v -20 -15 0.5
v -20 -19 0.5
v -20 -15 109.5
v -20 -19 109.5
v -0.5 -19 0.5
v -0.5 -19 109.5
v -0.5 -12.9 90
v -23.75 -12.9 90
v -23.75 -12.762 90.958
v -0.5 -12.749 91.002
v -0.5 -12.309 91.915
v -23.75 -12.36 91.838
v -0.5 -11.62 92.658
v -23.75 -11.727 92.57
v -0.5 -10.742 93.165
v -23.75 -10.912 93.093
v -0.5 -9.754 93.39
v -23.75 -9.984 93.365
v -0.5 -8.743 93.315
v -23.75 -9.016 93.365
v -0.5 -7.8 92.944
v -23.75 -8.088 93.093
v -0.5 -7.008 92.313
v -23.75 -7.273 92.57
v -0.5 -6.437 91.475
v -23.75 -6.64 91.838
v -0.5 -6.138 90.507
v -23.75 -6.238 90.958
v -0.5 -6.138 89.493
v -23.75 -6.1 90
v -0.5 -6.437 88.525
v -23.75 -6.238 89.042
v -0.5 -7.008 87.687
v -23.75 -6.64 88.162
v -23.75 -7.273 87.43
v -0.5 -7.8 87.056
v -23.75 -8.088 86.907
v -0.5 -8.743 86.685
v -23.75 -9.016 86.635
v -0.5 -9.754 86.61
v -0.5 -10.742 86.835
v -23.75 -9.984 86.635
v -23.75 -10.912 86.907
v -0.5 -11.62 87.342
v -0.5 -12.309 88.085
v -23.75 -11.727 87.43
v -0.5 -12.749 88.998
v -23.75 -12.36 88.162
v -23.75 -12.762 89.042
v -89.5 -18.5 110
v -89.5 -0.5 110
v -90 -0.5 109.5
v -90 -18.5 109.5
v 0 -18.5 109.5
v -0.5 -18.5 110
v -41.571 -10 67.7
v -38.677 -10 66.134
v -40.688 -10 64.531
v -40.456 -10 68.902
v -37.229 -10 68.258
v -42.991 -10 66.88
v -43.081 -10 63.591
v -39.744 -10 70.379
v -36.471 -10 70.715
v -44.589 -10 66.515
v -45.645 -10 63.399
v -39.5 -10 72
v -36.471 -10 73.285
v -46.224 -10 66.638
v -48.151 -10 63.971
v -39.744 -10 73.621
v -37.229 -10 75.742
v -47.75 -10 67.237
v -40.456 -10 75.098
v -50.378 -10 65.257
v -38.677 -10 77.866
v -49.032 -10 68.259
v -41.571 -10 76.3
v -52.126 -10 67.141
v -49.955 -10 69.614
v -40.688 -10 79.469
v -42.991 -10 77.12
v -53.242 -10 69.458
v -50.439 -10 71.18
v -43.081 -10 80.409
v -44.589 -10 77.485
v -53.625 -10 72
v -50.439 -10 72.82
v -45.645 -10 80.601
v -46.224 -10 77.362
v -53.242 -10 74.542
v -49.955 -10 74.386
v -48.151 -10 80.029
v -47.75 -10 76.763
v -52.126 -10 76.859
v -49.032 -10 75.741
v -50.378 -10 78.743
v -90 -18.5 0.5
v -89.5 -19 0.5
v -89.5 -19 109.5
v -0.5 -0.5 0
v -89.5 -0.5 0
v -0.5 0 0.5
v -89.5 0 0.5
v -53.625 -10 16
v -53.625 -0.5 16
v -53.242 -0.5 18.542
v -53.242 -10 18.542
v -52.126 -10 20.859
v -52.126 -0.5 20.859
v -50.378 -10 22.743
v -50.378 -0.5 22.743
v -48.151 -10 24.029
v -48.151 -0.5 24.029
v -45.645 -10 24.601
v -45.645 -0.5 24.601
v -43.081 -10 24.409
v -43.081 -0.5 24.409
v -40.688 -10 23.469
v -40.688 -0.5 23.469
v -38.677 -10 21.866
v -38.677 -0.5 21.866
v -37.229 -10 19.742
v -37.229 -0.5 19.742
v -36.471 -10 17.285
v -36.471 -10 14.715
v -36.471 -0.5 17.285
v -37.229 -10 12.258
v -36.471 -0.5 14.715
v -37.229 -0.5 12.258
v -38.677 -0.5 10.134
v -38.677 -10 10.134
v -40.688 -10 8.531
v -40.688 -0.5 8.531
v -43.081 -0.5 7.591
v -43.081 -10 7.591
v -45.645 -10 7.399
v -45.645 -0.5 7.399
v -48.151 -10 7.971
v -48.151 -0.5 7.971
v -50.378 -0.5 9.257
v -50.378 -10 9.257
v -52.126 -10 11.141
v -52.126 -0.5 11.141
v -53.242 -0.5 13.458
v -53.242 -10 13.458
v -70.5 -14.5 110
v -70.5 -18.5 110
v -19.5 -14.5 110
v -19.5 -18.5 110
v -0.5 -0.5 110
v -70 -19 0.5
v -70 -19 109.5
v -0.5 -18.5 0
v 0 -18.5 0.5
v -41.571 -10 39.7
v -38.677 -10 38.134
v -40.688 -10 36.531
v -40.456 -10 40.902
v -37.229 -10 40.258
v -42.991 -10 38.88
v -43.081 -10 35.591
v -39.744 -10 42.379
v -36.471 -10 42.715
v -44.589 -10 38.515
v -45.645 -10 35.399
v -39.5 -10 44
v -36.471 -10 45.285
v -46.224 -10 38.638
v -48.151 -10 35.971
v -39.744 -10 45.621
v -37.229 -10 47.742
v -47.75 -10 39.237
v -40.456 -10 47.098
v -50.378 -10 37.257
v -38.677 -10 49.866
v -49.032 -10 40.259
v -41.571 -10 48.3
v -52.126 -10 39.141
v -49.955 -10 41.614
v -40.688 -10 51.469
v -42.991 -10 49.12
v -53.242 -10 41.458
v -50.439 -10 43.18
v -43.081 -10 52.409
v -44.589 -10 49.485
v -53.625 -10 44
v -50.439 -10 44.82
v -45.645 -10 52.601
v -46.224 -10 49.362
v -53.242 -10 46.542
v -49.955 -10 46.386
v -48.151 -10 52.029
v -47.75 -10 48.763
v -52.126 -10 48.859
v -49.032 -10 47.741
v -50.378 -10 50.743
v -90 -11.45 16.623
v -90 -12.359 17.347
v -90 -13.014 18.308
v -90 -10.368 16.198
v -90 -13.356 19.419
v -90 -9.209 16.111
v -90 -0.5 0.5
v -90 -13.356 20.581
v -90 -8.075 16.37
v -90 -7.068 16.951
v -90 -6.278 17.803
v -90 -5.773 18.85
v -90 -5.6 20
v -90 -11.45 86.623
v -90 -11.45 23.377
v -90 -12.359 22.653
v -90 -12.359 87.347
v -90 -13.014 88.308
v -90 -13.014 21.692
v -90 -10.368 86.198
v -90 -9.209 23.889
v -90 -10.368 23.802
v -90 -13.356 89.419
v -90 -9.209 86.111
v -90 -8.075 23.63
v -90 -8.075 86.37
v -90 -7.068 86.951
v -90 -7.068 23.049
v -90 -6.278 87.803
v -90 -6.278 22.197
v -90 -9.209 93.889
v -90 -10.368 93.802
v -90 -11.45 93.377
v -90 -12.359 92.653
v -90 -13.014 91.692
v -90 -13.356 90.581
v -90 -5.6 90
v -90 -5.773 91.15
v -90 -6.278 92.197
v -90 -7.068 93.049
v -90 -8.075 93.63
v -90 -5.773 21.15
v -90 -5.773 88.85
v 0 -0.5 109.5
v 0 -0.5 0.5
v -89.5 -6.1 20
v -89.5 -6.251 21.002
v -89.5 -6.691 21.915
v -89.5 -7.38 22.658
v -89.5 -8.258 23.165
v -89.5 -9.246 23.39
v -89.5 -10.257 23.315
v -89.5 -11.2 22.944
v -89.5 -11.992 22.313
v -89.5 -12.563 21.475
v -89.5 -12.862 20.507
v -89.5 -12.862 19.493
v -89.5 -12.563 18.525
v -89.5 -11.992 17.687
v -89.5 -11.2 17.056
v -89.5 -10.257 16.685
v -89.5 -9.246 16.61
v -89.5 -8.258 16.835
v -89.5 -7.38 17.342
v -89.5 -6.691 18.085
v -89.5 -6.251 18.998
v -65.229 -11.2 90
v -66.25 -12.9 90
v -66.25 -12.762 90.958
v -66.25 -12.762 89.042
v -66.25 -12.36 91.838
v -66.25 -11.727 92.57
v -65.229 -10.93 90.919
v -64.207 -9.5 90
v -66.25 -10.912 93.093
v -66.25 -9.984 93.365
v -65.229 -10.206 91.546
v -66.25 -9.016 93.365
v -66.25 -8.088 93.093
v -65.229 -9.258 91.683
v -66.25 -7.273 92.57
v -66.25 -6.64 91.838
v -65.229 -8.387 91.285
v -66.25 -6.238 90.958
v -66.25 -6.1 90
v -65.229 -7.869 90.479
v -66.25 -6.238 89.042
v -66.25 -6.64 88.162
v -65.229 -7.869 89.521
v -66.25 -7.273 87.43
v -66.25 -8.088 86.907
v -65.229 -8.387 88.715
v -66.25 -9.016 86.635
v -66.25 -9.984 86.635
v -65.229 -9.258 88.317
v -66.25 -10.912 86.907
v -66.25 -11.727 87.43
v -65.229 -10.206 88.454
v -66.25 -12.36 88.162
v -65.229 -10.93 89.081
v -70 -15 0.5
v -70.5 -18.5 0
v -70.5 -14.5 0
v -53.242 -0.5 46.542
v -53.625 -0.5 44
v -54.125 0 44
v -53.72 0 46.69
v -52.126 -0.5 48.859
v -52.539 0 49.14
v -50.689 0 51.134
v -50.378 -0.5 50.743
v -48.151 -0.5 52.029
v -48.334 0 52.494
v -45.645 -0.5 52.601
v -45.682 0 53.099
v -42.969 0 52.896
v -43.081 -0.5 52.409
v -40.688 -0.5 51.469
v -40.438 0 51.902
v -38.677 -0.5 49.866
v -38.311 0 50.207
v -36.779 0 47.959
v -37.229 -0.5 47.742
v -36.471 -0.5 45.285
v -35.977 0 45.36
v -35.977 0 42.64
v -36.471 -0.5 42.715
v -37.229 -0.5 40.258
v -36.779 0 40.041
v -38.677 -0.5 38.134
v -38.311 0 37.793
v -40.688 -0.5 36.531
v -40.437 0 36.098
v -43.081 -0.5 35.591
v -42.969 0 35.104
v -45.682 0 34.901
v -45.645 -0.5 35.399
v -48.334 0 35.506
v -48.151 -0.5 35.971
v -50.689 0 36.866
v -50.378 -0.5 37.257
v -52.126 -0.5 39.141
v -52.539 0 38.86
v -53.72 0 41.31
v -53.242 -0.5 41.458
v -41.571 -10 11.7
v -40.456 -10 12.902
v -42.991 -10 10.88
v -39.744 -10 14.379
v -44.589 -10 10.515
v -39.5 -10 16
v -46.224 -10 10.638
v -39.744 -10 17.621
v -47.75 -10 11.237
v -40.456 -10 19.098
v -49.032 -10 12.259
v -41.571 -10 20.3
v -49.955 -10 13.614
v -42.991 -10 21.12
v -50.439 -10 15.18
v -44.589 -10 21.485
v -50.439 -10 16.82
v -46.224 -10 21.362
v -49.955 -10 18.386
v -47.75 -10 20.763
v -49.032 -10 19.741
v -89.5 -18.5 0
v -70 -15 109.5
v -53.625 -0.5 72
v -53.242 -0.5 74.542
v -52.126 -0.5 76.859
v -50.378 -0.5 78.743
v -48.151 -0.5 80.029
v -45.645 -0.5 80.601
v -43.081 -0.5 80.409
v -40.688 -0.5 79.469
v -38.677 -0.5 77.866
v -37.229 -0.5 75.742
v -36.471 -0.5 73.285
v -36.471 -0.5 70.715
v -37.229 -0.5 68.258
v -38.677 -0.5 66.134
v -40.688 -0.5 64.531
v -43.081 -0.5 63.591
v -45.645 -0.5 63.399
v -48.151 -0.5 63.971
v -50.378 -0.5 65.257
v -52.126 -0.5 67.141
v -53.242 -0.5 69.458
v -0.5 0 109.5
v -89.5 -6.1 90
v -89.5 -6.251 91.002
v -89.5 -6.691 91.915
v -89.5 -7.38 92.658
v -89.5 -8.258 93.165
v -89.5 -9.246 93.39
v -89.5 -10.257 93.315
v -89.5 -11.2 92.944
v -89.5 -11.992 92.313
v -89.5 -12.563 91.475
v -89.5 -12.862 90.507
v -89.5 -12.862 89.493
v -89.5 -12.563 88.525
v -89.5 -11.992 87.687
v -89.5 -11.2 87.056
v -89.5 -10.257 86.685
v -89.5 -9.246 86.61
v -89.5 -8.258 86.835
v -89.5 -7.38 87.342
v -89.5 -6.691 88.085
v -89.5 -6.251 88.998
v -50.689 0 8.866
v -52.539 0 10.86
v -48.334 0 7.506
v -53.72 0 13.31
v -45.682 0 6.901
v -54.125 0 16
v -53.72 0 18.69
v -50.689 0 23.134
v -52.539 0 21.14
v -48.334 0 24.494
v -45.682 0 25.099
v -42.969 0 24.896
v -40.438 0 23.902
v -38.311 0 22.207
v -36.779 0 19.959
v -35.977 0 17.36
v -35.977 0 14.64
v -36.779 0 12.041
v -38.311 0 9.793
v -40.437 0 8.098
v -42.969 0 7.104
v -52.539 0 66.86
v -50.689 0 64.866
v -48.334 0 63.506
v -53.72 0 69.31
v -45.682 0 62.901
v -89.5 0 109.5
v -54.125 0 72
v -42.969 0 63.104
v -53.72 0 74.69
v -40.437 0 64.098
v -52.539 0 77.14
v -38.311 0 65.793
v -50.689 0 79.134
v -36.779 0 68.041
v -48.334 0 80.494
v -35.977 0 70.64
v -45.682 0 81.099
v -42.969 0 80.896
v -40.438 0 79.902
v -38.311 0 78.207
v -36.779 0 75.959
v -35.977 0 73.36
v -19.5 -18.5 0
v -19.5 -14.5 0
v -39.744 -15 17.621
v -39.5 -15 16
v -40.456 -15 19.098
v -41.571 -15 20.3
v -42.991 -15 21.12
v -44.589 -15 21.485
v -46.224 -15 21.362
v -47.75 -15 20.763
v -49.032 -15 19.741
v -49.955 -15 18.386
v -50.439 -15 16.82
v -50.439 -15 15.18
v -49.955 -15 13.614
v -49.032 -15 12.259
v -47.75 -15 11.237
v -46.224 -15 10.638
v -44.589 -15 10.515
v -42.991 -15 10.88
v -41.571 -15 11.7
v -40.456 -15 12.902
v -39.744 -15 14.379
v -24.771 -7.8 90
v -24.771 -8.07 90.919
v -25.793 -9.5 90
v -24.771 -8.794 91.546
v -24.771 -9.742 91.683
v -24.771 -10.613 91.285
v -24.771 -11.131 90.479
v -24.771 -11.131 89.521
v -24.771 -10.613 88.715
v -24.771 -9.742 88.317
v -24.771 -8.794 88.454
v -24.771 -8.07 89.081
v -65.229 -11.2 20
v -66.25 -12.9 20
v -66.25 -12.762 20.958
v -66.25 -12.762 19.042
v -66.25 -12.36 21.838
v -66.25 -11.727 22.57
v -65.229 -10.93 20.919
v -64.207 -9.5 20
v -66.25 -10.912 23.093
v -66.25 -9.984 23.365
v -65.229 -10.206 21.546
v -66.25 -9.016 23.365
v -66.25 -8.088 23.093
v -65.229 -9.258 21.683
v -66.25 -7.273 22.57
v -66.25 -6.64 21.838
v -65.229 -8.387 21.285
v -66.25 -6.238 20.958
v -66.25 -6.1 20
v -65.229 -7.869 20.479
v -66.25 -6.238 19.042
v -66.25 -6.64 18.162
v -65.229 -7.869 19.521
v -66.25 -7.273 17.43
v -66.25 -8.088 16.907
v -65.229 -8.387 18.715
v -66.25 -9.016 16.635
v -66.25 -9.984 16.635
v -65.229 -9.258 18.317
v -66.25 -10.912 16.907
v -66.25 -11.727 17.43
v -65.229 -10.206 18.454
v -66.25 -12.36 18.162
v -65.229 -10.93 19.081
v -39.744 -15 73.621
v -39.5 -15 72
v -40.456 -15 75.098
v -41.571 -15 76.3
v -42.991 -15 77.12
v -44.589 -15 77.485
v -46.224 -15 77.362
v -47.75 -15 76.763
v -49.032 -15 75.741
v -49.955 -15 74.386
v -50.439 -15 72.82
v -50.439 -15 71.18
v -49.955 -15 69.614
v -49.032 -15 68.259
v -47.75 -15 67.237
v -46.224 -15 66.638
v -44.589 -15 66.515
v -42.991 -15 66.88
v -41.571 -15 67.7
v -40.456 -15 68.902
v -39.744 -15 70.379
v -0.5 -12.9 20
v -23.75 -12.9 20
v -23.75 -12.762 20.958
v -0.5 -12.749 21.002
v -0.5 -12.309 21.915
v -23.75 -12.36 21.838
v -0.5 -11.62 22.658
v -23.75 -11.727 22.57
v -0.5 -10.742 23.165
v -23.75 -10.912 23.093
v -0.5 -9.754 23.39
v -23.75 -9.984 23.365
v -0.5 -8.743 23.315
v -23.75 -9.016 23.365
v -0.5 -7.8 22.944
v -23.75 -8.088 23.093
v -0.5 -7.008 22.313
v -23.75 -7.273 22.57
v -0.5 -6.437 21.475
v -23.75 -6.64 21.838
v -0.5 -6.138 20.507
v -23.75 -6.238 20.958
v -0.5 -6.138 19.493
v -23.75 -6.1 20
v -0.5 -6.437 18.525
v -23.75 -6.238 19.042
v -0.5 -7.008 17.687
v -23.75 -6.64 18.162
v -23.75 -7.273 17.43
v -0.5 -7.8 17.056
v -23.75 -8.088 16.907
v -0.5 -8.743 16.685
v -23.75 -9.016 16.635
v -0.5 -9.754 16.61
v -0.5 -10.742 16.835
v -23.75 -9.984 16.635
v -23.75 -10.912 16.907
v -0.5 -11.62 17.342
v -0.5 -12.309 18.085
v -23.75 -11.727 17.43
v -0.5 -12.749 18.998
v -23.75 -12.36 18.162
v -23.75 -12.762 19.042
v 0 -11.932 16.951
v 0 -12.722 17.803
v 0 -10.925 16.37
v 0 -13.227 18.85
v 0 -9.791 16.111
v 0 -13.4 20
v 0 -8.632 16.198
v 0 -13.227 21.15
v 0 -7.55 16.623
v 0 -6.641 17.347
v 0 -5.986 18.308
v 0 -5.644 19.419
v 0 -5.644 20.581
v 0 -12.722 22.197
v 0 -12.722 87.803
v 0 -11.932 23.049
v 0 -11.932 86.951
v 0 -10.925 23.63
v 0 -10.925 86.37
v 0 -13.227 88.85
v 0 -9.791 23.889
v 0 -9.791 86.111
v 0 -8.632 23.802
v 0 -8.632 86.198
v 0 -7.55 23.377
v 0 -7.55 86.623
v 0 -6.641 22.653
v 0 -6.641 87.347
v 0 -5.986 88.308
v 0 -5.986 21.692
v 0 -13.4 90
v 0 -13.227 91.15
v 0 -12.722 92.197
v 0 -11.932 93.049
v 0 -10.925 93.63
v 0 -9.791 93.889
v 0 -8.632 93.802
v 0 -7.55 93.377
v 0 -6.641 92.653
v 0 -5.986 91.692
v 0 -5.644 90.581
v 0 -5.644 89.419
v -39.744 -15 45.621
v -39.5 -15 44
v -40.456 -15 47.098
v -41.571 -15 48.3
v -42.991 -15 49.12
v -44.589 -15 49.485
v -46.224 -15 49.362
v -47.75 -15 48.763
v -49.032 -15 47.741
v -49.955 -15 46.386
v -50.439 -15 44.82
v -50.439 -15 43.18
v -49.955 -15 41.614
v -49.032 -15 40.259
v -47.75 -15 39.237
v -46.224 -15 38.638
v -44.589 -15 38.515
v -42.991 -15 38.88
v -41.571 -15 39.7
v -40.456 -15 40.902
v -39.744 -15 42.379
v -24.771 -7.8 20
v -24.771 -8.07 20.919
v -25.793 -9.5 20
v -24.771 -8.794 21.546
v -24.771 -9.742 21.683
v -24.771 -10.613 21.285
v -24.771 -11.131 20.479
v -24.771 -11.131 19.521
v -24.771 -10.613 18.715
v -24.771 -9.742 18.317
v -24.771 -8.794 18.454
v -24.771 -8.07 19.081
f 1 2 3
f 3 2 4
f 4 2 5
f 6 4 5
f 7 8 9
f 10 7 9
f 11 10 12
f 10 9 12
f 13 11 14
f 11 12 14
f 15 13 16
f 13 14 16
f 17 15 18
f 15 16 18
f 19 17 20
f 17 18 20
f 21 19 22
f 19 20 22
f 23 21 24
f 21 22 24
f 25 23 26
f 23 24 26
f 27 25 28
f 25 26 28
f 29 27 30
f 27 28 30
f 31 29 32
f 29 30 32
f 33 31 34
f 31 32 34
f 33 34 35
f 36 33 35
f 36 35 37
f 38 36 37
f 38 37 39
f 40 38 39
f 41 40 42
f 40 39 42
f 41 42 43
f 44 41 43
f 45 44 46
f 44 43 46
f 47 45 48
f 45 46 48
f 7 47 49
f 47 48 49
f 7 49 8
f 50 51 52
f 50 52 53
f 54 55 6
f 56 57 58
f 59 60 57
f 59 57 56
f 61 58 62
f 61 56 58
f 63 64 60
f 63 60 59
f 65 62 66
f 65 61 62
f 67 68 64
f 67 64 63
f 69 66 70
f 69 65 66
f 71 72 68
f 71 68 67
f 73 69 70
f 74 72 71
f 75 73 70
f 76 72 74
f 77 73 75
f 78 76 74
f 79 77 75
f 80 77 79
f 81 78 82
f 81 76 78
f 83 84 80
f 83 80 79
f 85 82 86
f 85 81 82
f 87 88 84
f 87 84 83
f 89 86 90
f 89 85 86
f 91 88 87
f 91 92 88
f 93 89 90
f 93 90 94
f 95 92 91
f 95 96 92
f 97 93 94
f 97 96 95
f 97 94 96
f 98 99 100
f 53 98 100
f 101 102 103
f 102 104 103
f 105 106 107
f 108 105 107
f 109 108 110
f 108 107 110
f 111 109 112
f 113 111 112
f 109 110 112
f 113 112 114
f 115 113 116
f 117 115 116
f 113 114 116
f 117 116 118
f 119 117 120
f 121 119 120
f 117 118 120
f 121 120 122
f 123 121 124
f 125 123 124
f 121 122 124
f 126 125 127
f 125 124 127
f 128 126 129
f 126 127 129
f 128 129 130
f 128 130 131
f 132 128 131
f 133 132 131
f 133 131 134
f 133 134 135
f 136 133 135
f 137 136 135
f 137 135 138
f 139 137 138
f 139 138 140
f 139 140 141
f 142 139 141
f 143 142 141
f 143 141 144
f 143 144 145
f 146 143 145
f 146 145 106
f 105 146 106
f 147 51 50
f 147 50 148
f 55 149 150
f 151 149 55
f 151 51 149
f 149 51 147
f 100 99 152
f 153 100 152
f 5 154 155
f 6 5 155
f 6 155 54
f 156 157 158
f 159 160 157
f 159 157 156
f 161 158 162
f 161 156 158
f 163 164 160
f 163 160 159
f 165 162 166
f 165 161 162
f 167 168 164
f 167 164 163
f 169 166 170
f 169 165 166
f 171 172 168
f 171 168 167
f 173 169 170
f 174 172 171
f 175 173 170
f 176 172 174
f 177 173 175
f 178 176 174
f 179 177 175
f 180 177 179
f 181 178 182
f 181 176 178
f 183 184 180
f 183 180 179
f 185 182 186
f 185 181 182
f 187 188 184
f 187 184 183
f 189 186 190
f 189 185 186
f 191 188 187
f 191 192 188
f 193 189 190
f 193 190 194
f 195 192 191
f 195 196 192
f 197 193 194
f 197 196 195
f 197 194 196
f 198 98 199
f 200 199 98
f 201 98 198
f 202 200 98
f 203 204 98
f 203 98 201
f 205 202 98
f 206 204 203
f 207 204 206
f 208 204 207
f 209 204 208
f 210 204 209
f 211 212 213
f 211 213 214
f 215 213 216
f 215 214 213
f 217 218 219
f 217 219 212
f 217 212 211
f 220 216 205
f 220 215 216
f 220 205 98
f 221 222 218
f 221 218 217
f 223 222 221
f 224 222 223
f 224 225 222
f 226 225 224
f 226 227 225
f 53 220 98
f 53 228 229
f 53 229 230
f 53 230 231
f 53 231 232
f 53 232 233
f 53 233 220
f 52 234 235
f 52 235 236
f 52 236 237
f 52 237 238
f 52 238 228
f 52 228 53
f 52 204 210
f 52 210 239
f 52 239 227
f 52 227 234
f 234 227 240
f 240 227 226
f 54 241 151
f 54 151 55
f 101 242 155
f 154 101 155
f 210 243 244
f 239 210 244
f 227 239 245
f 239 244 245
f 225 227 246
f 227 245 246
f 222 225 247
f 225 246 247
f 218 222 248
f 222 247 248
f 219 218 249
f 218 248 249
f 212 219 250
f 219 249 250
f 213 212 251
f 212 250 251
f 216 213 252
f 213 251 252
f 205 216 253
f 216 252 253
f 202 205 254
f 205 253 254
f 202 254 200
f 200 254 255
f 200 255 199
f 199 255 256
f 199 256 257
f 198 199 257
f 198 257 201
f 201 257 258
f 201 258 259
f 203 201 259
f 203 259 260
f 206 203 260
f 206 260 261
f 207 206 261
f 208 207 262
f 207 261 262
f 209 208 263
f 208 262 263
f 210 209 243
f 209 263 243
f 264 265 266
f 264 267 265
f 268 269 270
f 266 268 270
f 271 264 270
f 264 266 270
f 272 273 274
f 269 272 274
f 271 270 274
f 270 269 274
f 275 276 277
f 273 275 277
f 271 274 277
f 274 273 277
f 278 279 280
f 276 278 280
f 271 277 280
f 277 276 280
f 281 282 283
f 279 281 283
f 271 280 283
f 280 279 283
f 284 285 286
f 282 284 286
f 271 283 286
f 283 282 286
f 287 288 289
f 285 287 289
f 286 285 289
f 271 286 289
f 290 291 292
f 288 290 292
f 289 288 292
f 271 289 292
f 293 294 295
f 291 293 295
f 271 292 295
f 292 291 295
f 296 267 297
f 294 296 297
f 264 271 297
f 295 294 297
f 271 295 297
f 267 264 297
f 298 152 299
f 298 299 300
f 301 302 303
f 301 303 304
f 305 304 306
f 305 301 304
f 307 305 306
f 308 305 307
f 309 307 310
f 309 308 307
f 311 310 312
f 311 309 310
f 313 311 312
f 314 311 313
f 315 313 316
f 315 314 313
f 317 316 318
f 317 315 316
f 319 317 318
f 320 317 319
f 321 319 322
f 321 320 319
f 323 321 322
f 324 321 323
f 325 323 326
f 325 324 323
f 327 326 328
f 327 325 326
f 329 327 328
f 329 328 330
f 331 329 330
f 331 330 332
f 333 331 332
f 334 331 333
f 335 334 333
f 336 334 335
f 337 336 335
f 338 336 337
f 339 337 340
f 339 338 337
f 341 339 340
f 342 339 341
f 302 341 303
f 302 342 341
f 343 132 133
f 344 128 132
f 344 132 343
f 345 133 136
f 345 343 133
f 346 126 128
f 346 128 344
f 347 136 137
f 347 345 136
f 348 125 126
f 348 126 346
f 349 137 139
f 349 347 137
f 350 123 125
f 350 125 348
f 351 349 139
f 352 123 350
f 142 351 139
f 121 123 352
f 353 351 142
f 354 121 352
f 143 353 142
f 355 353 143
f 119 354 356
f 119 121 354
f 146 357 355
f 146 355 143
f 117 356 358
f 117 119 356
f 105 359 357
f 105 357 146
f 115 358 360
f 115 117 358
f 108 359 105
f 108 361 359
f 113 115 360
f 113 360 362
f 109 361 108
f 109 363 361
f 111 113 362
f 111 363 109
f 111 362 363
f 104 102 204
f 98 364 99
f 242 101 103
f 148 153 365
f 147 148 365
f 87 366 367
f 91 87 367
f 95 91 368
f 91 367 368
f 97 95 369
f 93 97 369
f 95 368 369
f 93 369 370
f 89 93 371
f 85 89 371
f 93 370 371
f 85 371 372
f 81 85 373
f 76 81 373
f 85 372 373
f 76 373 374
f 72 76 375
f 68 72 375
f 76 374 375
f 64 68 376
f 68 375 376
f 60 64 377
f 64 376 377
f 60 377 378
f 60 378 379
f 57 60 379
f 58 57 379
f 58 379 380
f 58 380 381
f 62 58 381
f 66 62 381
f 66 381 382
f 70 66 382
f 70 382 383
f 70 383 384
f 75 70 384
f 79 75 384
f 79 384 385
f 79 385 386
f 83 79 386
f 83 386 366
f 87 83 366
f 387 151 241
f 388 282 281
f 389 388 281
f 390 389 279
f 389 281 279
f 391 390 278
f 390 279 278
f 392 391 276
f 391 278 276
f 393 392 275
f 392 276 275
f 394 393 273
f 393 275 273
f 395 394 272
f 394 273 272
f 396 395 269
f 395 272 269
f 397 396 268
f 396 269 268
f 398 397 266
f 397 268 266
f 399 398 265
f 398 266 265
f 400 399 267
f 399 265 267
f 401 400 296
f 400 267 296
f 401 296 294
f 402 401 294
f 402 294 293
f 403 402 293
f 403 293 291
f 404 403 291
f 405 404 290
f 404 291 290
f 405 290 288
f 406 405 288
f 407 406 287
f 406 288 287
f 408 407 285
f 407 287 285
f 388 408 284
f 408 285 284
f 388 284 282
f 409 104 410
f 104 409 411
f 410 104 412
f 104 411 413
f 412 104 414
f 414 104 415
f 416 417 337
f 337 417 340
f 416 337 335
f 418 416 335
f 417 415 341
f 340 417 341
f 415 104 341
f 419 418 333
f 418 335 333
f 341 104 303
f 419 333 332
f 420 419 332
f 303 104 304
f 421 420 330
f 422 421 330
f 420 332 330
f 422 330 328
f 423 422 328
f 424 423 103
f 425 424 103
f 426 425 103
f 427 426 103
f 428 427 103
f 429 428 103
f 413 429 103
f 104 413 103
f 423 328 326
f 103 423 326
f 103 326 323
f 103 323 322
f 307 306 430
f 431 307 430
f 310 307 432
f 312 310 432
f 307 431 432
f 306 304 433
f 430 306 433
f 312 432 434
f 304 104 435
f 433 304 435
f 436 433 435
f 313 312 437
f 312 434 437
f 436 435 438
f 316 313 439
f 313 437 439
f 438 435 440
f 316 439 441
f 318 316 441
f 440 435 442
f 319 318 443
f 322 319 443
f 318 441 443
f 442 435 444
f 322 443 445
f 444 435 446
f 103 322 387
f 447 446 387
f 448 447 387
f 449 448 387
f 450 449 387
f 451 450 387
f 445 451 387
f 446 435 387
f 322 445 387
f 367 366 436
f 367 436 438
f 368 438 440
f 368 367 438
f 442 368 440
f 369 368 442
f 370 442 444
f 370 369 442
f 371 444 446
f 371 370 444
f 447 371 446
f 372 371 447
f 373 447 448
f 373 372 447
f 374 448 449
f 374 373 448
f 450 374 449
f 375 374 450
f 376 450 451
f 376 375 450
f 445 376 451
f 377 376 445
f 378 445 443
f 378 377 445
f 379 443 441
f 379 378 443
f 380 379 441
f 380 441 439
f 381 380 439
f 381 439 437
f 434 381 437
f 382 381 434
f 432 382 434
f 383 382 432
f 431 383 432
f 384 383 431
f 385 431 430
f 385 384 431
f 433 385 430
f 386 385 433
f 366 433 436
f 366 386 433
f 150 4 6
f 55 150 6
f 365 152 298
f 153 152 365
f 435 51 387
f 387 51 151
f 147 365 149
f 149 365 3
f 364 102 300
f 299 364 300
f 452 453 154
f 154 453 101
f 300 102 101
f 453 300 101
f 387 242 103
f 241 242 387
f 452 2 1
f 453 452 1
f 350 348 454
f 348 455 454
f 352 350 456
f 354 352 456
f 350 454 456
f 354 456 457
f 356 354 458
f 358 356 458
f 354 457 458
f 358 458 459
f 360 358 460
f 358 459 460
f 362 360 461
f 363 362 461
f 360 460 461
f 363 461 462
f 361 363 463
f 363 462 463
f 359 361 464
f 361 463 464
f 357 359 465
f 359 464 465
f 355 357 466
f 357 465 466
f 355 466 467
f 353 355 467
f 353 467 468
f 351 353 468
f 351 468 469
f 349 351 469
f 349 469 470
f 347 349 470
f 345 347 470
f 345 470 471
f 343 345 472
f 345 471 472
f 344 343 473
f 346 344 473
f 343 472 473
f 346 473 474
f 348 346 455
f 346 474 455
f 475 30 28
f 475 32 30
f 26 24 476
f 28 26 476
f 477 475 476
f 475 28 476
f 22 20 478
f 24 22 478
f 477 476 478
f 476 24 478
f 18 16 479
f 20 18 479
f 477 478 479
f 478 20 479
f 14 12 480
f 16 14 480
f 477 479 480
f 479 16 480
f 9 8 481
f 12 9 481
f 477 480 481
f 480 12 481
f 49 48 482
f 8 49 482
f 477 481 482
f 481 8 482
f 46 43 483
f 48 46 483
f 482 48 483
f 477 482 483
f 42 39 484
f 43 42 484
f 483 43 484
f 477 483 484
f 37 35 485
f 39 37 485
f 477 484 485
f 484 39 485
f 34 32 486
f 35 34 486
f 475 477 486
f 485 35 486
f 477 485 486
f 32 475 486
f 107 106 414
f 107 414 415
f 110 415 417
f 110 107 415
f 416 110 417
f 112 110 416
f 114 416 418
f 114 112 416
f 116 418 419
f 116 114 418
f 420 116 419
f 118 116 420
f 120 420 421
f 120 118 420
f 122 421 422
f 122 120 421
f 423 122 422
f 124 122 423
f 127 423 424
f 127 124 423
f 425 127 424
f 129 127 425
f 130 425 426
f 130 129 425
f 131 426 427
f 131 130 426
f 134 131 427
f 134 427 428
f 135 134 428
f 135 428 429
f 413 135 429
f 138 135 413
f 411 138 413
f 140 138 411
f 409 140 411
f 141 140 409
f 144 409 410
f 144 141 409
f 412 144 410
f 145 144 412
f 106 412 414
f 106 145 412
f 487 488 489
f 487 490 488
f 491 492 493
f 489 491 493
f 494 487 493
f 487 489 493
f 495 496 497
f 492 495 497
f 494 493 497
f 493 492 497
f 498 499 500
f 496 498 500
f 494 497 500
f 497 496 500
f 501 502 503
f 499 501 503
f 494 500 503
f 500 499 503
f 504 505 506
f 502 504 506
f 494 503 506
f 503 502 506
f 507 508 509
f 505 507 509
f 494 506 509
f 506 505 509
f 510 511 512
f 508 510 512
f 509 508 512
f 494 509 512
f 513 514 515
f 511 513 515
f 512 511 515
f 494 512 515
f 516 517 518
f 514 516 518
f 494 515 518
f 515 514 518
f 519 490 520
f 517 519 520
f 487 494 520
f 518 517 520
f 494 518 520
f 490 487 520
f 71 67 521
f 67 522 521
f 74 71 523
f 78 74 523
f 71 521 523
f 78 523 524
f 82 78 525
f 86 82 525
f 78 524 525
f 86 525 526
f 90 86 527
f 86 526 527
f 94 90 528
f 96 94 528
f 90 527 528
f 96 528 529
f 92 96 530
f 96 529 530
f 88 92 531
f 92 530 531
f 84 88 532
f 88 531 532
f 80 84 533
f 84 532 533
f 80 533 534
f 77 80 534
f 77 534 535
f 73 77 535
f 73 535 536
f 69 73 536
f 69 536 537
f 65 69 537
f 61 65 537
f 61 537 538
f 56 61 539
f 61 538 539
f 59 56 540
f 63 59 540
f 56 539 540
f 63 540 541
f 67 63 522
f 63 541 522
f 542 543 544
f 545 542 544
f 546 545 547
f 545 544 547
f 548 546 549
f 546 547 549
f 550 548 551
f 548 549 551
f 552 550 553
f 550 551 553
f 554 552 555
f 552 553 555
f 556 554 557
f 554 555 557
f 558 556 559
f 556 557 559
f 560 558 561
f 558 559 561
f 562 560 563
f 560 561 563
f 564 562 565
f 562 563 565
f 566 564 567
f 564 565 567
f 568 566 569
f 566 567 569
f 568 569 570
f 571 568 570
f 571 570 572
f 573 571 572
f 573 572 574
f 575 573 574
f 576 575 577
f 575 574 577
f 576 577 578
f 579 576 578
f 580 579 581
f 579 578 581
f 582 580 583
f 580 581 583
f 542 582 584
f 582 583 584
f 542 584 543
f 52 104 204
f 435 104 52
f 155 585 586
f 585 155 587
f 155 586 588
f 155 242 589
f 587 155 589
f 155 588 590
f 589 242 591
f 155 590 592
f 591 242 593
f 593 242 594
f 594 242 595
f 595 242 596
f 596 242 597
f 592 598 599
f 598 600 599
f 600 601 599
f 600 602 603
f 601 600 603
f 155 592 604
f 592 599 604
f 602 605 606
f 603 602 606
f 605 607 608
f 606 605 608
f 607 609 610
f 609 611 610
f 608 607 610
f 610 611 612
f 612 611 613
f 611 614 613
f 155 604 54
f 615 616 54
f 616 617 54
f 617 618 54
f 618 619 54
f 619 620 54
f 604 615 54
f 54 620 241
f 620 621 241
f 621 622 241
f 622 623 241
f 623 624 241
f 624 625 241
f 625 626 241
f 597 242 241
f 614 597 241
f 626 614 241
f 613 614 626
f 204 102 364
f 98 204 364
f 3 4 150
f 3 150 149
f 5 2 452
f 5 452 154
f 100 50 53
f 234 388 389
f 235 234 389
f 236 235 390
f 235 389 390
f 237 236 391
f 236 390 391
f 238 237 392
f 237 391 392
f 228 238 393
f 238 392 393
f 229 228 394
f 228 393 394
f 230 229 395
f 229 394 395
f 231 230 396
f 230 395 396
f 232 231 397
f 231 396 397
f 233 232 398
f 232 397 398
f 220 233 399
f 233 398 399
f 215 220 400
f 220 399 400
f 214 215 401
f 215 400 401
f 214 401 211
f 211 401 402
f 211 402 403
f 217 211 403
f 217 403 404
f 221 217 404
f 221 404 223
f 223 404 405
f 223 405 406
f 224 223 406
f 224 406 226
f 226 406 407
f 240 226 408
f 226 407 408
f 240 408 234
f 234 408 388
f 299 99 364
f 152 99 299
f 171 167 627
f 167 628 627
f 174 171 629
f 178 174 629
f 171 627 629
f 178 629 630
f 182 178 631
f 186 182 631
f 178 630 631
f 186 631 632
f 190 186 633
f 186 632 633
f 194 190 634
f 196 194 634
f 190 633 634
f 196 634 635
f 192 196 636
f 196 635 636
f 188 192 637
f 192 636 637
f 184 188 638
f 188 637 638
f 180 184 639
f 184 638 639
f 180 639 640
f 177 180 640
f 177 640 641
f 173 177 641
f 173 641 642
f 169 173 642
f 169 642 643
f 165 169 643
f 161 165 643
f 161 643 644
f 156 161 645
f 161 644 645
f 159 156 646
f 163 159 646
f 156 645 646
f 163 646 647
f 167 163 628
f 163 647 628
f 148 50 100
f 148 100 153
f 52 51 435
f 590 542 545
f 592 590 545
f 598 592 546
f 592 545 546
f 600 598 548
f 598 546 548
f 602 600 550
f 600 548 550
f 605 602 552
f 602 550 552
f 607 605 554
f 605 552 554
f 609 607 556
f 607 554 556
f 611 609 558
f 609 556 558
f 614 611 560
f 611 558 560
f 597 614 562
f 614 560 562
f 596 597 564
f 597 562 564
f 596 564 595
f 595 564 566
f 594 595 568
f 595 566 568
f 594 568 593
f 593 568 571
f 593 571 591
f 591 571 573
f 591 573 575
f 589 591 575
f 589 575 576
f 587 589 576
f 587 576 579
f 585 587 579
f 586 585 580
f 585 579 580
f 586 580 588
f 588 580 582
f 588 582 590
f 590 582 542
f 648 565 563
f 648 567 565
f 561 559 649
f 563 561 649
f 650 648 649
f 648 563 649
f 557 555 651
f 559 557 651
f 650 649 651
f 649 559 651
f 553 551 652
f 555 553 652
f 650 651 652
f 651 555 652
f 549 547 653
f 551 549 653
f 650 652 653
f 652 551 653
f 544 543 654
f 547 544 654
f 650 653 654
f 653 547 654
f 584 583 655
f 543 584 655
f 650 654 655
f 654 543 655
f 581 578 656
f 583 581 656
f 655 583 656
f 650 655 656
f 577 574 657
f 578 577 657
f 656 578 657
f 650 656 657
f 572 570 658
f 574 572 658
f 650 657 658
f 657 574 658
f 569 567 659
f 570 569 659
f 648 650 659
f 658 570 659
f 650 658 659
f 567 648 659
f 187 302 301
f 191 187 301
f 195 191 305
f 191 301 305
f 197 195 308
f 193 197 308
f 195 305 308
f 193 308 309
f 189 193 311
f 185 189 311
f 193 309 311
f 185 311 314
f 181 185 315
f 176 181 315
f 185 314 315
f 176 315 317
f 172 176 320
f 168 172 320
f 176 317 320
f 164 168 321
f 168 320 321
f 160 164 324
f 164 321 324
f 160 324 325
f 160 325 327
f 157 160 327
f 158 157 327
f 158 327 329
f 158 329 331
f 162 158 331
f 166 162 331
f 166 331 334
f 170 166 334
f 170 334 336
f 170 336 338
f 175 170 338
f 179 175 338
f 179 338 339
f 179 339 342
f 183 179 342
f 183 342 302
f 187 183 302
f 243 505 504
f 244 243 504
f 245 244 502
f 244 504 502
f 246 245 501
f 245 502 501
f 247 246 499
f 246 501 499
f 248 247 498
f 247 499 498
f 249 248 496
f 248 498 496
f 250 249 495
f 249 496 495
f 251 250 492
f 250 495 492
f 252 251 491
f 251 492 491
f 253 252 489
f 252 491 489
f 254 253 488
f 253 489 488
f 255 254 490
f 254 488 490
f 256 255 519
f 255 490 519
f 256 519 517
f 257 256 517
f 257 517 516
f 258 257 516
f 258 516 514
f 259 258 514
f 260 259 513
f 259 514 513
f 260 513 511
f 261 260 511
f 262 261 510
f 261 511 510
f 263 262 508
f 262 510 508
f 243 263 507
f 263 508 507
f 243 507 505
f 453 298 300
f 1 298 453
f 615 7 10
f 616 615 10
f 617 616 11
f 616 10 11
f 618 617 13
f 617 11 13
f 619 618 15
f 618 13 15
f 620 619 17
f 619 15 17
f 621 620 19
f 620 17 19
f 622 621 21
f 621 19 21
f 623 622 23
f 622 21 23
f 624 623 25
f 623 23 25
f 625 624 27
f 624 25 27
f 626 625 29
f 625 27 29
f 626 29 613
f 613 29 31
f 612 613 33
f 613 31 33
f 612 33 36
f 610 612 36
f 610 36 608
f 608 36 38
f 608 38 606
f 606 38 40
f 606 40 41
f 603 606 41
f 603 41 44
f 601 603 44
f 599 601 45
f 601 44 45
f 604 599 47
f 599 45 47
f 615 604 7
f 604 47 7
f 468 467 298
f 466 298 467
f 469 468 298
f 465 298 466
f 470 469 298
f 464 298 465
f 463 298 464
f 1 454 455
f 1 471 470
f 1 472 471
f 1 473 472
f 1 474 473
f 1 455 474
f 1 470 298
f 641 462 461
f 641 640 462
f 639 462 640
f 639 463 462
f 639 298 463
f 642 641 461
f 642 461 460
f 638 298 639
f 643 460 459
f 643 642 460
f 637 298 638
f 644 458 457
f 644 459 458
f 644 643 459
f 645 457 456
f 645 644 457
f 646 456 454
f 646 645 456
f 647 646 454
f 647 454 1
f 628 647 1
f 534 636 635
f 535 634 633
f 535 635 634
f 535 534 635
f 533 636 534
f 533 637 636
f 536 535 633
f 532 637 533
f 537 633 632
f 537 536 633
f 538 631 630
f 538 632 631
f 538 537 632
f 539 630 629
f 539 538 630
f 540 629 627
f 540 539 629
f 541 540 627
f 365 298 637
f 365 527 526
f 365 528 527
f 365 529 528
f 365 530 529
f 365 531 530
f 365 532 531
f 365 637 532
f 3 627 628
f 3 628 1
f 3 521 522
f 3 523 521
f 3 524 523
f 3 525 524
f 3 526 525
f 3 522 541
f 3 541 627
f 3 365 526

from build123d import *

# Parameters (mm, degrees)
F0_W           = 90
F0_H           = 110
F1_DEPTH       = 19
F2_W           = 50
F2_H           = 110
F3_DEPTH       = 4
F5_D           = 11
F5_CBORE_D     = 17.25
F5_CBORE_DEPTH = 10
F8_D           = 6.8
F8_DEPTH       = 23.75
F8_TIP         = 2.0429261047
F8_ON_F7_D     = 6.8
F8_ON_F7_DEPTH = 23.75
F8_ON_F7_TIP   = 2.0429261047
F9_SIZE        = 0.5


with BuildPart() as f1:
    # F0 (on Front) → F1 (new body)
    with BuildSketch(Plane.XZ):
        with Locations((-45, 55)):
            Rectangle(F0_W, F0_H)
    extrude(amount=F1_DEPTH)

    # F2 (on face) → F3 (cut)
    with BuildSketch(Plane.XZ.offset(19)):
        with Locations((-45, 55)):
            Rectangle(F2_W, F2_H)
    extrude(amount=-F3_DEPTH, mode=Mode.SUBTRACT)

    # F5 (through all)
    with Locations(Plane(origin=(0, 0, 0), x_dir=(-1, 0, 0), z_dir=(0, 1, 0))):
        with Locations((45, 72), (45, 44), (45, 16)):
            CounterBoreHole(F5_D / 2, F5_CBORE_D / 2, F5_CBORE_DEPTH)

    # F8
    with Locations(Plane.YZ):
        with Locations((-9.5, 90), (-9.5, 20)):
            Hole(F8_D / 2, depth=F8_DEPTH)
            with Locations((0, 0, -(F8_DEPTH + F8_TIP / 2))):  # 118° drill point
                Cone(0, F8_D / 2, F8_TIP, mode=Mode.SUBTRACT)

    # F8 on F7
    with Locations(Plane(origin=(-90, 0, 0), x_dir=(0, -1, 0), z_dir=(-1, 0, 0))):
        with Locations((9.5, 90), (9.5, 20)):
            Hole(F8_ON_F7_D / 2, depth=F8_ON_F7_DEPTH)
            with Locations((0, 0, -(F8_ON_F7_DEPTH + F8_ON_F7_TIP / 2))):  # 118° drill point
                Cone(0, F8_ON_F7_D / 2, F8_ON_F7_TIP, mode=Mode.SUBTRACT)

    # F9
    f9_edges = [f1.edges().sort_by_distance(p)[0] for p in [
        (-45, 0, 110),
        (-90, -9.5, 110),
        (-80, -19, 110),
        (-70, -17, 110),
        (-45, -15, 110),
        (-20, -17, 110),
        (-10, -19, 110),
        (0, -9.5, 110),
        (-45, 0, 0),
        (0, -9.5, 0),
        (-10, -19, 0),
        (-20, -17, 0),
        (-45, -15, 0),
        (-70, -17, 0),
        (-80, -19, 0),
        (-90, -9.5, 0),
        (0, 0, 55),
        (0, -19, 55),
        (0, -12.9, 20),
        (0, -12.9, 90),
        (-90, 0, 55),
        (-90, -19, 55),
        (-90, -6.1, 90),
        (-90, -6.1, 20),
        (-36.375, 0, 16),
        (-36.375, 0, 44),
        (-36.375, 0, 72),
    ]]
    chamfer(f9_edges, length=F9_SIZE)


solid = f1.part
